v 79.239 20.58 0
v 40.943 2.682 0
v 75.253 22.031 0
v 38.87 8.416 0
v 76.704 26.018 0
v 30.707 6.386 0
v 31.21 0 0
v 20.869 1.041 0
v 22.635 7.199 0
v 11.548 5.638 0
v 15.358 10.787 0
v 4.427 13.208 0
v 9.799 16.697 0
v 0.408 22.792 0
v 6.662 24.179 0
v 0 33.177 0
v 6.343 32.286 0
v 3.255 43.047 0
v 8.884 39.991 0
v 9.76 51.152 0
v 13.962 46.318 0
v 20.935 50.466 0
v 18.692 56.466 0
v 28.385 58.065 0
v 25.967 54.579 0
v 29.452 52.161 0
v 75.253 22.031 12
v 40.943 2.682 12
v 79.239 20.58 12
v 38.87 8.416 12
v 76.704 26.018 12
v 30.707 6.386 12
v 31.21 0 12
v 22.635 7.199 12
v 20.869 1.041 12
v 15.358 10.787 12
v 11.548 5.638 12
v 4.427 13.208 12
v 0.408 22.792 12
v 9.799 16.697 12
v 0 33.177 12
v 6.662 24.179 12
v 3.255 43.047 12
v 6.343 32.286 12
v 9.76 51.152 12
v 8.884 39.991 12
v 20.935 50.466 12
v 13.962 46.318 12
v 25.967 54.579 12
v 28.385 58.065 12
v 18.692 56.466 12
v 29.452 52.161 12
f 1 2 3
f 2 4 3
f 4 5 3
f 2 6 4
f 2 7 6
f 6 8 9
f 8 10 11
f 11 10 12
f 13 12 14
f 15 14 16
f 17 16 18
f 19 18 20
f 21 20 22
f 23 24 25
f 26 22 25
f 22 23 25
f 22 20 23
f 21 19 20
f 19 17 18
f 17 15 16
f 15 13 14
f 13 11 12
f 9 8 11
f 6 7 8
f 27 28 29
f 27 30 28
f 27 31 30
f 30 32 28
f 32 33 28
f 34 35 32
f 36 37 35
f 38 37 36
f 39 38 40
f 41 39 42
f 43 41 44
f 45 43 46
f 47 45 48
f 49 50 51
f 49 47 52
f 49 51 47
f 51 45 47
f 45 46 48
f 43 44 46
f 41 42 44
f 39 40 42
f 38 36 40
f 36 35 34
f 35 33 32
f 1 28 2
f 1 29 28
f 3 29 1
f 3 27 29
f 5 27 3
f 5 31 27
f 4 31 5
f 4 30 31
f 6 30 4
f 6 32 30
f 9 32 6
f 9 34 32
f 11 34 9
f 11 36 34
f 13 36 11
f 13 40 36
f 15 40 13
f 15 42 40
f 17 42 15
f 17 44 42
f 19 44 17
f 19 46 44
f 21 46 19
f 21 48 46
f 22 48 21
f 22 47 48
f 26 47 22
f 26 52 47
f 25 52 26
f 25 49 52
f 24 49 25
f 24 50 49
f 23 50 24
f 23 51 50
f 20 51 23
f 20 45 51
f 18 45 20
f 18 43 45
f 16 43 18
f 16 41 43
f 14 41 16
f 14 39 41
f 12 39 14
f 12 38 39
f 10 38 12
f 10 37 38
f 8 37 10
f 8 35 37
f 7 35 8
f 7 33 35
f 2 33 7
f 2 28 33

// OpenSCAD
$fn = 32;

// ----------------------------------------------------------------------
// Hook plate: curl radius 26 mm over 205 degrees, 6 mm thick band
// ----------------------------------------------------------------------

// --- parameters (mm) ---
profile_height = 12;      // extrusion height
profile_points = 26;      // points of the closed outline

profile = [[25.967, 54.579], [28.385, 58.065], [18.692, 56.466], [9.76, 51.152], [3.255, 43.047], [0, 33.177], [0.408, 22.792], [4.427, 13.208], [11.548, 5.638], [20.869, 1.041], [31.21, 0], [40.943, 2.682], [79.239, 20.58], [75.253, 22.031], [76.704, 26.018], [38.87, 8.416], [30.707, 6.386], [22.635, 7.199], [15.358, 10.787], [9.799, 16.697], [6.662, 24.179], [6.343, 32.286], [8.884, 39.991], [13.962, 46.318], [20.935, 50.466], [29.452, 52.161]];  // single closed polygon, 26 points, counter clockwise

// --- the one profile operation ---
linear_extrude(height = profile_height) polygon(points = profile);
